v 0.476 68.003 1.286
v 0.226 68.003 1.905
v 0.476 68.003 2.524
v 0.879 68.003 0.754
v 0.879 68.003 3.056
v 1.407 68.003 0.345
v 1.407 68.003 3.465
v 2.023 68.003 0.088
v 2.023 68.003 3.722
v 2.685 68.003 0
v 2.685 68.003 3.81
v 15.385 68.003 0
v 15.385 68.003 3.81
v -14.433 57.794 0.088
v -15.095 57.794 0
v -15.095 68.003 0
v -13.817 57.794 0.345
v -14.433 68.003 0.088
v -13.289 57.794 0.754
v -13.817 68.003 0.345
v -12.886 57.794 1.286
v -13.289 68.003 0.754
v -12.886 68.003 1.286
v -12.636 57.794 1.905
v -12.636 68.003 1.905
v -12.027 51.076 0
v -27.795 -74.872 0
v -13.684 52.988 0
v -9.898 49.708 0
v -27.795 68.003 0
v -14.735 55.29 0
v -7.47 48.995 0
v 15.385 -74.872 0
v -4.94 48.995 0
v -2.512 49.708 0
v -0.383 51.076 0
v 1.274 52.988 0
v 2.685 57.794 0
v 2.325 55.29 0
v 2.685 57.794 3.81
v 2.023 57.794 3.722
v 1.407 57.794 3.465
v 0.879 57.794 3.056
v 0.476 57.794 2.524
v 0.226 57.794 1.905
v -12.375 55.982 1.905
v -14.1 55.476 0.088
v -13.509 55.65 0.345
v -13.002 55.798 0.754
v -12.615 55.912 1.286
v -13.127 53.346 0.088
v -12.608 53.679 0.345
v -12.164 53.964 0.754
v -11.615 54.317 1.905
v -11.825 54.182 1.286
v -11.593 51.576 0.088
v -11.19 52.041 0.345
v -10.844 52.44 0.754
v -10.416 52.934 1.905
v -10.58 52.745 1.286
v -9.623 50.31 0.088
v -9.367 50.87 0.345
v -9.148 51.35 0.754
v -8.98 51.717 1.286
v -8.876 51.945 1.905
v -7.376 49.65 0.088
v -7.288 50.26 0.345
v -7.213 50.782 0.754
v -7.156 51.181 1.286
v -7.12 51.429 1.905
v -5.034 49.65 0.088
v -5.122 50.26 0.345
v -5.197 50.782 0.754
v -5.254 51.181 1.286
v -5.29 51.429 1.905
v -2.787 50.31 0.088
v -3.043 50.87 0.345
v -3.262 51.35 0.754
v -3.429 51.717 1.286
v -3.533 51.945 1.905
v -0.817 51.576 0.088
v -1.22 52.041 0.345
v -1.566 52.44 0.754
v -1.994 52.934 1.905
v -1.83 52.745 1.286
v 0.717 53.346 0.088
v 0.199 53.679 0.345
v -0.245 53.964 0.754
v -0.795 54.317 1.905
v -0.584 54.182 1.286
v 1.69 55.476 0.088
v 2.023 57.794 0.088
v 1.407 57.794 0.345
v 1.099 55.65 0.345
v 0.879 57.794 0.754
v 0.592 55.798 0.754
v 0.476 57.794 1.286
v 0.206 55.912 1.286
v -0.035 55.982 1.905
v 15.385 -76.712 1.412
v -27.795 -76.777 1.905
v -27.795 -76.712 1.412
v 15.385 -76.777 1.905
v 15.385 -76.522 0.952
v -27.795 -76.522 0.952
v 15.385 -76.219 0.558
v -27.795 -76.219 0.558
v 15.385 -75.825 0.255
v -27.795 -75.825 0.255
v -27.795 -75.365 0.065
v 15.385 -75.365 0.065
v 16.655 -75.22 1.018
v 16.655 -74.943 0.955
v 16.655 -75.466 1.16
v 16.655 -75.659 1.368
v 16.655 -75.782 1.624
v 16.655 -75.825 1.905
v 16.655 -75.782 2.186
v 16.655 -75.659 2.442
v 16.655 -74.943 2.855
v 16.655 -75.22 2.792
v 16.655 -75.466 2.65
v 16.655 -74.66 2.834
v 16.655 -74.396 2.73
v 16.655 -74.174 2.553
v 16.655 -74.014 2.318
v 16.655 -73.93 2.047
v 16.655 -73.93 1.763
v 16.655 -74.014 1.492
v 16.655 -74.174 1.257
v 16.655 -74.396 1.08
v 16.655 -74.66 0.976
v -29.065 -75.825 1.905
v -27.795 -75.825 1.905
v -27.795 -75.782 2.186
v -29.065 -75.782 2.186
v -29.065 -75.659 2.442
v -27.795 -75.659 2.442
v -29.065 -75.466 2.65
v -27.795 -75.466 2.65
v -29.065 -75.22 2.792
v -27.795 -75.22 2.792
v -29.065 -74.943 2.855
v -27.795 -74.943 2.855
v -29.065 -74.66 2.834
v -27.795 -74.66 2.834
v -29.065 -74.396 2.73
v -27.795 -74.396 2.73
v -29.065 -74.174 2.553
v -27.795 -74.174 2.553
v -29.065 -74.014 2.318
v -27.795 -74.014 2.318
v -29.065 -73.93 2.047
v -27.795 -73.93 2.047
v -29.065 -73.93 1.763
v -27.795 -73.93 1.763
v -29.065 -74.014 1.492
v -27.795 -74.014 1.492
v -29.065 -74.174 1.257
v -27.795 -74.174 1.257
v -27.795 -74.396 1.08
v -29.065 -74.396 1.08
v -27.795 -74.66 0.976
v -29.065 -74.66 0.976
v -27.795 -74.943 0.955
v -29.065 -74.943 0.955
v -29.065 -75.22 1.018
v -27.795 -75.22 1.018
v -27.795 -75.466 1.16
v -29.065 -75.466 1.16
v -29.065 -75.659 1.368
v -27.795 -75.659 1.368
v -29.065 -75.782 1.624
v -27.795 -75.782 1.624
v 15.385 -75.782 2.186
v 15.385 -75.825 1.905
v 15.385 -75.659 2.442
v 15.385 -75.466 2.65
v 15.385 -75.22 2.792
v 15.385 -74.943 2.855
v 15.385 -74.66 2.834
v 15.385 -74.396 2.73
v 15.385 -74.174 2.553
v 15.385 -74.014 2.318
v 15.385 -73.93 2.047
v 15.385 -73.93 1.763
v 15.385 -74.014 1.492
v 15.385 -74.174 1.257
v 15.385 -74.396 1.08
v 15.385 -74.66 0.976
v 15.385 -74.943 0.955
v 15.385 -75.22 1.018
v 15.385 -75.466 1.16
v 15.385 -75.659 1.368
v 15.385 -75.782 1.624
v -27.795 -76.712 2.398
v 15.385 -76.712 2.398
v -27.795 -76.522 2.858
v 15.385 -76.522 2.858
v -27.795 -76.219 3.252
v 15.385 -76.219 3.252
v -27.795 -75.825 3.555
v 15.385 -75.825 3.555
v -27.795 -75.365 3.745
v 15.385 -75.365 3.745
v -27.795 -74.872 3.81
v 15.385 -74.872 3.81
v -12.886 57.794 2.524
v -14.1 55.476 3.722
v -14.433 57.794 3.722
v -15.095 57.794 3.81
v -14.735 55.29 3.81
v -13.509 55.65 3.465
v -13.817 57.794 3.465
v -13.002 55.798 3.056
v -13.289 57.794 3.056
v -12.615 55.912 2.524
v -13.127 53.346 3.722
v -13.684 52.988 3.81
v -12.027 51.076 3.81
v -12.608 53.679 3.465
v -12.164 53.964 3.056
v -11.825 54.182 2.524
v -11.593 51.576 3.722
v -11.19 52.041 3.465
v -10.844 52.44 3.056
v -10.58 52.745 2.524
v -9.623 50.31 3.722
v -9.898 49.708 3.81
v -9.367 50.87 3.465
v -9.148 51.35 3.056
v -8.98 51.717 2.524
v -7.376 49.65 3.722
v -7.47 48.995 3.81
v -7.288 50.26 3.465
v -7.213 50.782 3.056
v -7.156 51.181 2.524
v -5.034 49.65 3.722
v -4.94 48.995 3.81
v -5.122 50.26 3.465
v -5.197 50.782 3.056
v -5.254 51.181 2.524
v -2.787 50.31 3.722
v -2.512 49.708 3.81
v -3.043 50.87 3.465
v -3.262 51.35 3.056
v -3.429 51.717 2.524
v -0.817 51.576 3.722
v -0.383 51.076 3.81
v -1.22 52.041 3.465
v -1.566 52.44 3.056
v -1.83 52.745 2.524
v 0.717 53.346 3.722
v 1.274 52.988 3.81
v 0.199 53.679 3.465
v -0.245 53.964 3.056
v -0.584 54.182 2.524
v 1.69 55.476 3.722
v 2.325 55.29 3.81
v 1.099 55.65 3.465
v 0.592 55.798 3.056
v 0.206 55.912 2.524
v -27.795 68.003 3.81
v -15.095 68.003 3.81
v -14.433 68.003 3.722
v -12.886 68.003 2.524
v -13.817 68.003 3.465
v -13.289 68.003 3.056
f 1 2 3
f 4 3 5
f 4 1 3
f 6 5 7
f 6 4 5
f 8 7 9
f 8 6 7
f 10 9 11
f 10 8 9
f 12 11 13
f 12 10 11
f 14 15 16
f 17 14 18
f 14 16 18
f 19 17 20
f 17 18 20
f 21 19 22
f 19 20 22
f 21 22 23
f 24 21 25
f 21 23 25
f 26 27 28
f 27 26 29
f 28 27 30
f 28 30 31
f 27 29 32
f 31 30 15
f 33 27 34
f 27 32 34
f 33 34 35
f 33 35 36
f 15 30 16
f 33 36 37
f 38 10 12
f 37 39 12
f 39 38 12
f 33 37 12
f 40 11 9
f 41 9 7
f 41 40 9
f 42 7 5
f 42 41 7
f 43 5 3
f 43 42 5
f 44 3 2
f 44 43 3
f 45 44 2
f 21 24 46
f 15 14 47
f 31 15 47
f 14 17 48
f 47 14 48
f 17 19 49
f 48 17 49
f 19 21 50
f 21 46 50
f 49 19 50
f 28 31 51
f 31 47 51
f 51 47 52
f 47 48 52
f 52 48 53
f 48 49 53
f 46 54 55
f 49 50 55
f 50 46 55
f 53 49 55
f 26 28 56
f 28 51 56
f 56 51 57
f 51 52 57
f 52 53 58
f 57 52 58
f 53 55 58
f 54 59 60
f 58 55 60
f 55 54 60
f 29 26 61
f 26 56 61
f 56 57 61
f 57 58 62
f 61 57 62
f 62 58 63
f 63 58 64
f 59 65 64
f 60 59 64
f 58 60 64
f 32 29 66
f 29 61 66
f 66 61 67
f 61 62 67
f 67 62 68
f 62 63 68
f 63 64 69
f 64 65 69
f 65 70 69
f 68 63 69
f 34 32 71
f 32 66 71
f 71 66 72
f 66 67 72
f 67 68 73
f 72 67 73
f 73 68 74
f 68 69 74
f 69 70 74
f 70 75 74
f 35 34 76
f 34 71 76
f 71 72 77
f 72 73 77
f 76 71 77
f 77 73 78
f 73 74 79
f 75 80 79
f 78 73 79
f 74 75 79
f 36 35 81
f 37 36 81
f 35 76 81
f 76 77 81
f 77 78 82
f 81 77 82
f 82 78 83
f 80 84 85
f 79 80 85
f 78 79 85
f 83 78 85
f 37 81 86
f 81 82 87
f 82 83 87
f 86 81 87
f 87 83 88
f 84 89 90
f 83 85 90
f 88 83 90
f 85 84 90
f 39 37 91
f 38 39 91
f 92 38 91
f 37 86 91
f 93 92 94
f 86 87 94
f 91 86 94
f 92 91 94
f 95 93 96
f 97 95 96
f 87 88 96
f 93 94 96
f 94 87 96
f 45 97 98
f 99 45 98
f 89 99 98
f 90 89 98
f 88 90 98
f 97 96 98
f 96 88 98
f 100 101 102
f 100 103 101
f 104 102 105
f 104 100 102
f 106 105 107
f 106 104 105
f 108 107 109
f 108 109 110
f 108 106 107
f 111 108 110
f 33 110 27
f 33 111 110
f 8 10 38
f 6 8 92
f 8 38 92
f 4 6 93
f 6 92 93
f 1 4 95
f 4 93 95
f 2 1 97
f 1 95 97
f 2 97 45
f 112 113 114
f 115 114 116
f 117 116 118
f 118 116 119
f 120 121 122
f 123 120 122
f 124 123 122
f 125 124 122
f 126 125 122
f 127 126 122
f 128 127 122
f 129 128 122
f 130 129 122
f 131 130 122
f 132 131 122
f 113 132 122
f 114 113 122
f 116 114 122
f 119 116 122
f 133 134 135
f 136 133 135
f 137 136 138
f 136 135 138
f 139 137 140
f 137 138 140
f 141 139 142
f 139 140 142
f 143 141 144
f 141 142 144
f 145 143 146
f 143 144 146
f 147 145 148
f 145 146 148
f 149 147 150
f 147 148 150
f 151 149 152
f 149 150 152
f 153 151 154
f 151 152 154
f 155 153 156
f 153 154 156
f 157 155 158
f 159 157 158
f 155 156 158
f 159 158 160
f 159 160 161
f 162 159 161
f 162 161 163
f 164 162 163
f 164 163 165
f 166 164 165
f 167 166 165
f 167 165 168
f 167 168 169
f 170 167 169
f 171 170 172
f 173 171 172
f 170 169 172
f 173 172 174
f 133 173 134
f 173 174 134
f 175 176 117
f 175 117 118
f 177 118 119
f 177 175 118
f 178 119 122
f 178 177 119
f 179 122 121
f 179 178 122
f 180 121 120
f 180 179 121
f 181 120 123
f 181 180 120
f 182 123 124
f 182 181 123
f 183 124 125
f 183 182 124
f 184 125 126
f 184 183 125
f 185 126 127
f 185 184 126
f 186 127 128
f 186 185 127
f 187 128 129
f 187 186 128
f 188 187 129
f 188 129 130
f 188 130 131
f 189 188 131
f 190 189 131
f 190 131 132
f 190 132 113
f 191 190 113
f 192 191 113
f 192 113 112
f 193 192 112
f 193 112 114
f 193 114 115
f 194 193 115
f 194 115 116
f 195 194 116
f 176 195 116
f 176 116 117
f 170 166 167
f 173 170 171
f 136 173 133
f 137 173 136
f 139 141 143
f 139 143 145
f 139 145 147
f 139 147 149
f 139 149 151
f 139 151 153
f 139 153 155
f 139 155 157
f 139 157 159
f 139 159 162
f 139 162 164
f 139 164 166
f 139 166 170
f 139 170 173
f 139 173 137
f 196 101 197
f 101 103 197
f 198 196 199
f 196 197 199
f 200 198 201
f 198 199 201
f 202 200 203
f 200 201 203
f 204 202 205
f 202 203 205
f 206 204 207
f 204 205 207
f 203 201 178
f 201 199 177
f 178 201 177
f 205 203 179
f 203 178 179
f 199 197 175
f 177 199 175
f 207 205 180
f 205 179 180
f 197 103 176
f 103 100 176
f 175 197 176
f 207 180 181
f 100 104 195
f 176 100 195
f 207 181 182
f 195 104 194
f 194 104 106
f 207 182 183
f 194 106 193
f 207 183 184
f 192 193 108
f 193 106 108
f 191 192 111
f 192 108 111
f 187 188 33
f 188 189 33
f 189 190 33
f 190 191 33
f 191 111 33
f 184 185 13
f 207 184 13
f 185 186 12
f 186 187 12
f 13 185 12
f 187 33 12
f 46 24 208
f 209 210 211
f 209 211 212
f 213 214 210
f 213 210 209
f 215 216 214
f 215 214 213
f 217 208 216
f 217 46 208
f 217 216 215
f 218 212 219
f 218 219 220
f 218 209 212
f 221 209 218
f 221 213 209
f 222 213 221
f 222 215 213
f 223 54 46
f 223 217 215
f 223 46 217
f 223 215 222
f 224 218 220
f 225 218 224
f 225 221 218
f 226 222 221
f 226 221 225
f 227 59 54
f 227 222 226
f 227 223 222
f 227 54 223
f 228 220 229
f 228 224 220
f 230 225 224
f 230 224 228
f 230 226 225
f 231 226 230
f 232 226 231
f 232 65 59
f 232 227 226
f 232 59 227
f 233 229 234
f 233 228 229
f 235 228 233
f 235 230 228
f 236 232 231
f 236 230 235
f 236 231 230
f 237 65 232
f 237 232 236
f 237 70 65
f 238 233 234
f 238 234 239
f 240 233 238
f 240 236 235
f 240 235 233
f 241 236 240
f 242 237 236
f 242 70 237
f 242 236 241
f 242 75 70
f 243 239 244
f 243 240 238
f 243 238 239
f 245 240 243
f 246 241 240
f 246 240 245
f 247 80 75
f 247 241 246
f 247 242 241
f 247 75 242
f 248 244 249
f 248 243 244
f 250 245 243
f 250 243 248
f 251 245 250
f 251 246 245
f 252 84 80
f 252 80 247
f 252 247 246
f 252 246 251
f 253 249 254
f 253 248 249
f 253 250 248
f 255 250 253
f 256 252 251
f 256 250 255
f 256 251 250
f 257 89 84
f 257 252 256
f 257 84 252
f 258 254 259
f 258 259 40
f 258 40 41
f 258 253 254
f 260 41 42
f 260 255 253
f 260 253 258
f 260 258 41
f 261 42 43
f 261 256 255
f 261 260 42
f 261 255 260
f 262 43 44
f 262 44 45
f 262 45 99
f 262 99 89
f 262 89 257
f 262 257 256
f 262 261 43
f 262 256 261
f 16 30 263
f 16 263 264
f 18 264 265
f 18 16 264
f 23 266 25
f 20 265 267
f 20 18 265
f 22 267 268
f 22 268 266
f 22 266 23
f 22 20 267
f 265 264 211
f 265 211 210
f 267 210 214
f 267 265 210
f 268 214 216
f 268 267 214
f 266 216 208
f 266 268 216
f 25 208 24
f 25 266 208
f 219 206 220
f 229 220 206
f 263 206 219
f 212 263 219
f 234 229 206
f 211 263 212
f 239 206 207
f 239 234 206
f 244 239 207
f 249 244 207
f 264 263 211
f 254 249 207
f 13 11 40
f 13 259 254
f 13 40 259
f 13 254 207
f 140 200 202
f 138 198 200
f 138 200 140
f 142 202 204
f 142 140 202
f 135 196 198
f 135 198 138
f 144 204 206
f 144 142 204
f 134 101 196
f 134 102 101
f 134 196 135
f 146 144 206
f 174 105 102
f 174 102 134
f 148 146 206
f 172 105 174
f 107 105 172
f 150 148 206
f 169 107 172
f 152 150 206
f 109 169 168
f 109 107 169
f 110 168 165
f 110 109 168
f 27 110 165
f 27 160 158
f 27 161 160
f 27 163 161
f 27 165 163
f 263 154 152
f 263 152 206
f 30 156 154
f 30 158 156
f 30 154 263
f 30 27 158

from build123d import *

# Parameters (mm, degrees)
F0_W          = 43.18
F0_H          = 144.78
F1_DEPTH      = 3.81
F3_DEPTH      = 25.4
F4_T3_DEPTH   = 16.5585234346
F4_T6_DEPTH   = 16.5585234346
F4_T9_ANGLE   = 180
F4_T12_DEPTH  = 16.5585234346
F4_T15_ANGLE  = 180
F4_T18_DEPTH  = 16.5585234346
F5_R          = 1.90499
F6_R          = 0.9525
F7_DEPTH      = 1.27
F7_DEPTH_BACK = 44.45


# Not quite as in the source:
# - a fillet or chamfer that OpenCascade refuses, or shapes differently, is made with other operations: its cross-section is extruded or revolved along the edge and cut away or added
# - a fillet or chamfer is up to 0.001 mm smaller than in the source, because OpenCascade refuses the exact size


with BuildPart() as f1:
    # F0 (on Top) → F1 (new body)
    with BuildSketch(Plane.XY):
        with Locations((-6.204857491, -4.3873040367)):
            Rectangle(F0_W, F0_H)
    extrude(amount=F1_DEPTH)

    # F2 (on face) → F3 (cut)
    with BuildSketch(Plane.XY.offset(3.81)):
        with BuildLine():
            ThreePointArc((0.145142509, 57.7941725286), (-6.204857491, 64.1441725286), (-12.554857491, 57.7941725286))
            Line((-12.554857491, 57.7941725286), (0.145142509, 57.7941725286))
        make_face()
        with BuildLine():
            Line((0.145142509, 68.0026959633), (-12.554857491, 68.0026959633))
            Line((-12.554857491, 68.0026959633), (-12.554857491, 57.7941725286))
            ThreePointArc((-12.554857491, 57.7941725286), (-6.204857491, 64.1441725286), (0.145142509, 57.7941725286))
            Line((0.145142509, 57.7941725286), (0.145142509, 68.0026959633))
        make_face()
        with BuildLine():
            Line((0.145142509, 57.7941725286), (-12.554857491, 57.7941725286))
            ThreePointArc((-12.554857491, 57.7941725286), (-6.204857491, 51.4441725286), (0.145142509, 57.7941725286))
        make_face()
    extrude(amount=-F3_DEPTH, mode=Mode.SUBTRACT)

    # F4: fillet of radius 2.54 on 2 edges, made by hand


with BuildPart() as f4_tool1:
    # F4_s2 → F4_t3 (new body)
    with BuildSketch(Plane.XZ.offset(-74.3526959633)):
        with BuildLine():
            ThreePointArc((-15.094857491, 3.81), (-13.2988062667, 3.0660512242), (-12.554857491, 1.27))
            Line((-12.554857491, 1.27), (-12.554857491, 3.81))
            Line((-12.554857491, 3.81), (-15.094857491, 3.81))
        make_face()
    extrude(amount=F4_T3_DEPTH)


with BuildPart() as f4_tool4:
    # F4_s5 → F4_t6 (new body)
    with BuildSketch(Plane.XZ.offset(-74.3526959633)):
        with BuildLine():
            ThreePointArc((-15.094857491, 0), (-13.2988062667, 0.7439487758), (-12.554857491, 2.54))
            Line((-12.554857491, 2.54), (-12.554857491, 0))
            Line((-12.554857491, 0), (-15.094857491, 0))
        make_face()
    extrude(amount=F4_T6_DEPTH)


with BuildPart() as f4_tool7:
    # F4_s8 → F4_t9 (revolve)
    with BuildSketch(Plane.XZ.offset(-57.7941725286)):
        with BuildLine():
            ThreePointArc((-15.094857491, 0), (-13.2988062667, 0.7439487758), (-12.554857491, 2.54))
            Line((-12.554857491, 2.54), (-12.554857491, 0))
            Line((-12.554857491, 0), (-15.094857491, 0))
        make_face()
    revolve(axis=Axis((-6.204857491, 57.7941725286, 0), (0, 0, 1)), revolution_arc=F4_T9_ANGLE)


with BuildPart() as f4_tool10:
    # F4_s11 → F4_t12 (new body)
    with BuildSketch(Plane.XZ.offset(-57.7941725286)):
        with BuildLine():
            ThreePointArc((2.685142509, 0), (0.8890912848, 0.7439487758), (0.145142509, 2.54))
            Line((0.145142509, 2.54), (0.145142509, 0))
            Line((0.145142509, 0), (2.685142509, 0))
        make_face()
    extrude(amount=-F4_T12_DEPTH)


with BuildPart() as f4_tool13:
    # F4_s14 → F4_t15 (revolve)
    with BuildSketch(Plane.XZ.offset(-57.7941725286)):
        with BuildLine():
            ThreePointArc((-15.094857491, 3.81), (-13.2988062667, 3.0660512242), (-12.554857491, 1.27))
            Line((-12.554857491, 1.27), (-12.554857491, 3.81))
            Line((-12.554857491, 3.81), (-15.094857491, 3.81))
        make_face()
    revolve(axis=Axis((-6.204857491, 57.7941725286, 3.81), (0, 0, 1)), revolution_arc=F4_T15_ANGLE)


with BuildPart() as f4_tool16:
    # F4_s17 → F4_t18 (new body)
    with BuildSketch(Plane.XZ.offset(-57.7941725286)):
        with BuildLine():
            ThreePointArc((2.685142509, 3.81), (0.8890912848, 3.0660512242), (0.145142509, 1.27))
            Line((0.145142509, 1.27), (0.145142509, 3.81))
            Line((0.145142509, 3.81), (2.685142509, 3.81))
        make_face()
    extrude(amount=-F4_T18_DEPTH)


with BuildPart() as f1_1:
    add(f1.part)

    # F4_t19: cut F4_tool1, F4_tool4, F4_tool7, F4_tool10, F4_tool13, F4_tool16
    add([f4_tool1.part, f4_tool4.part, f4_tool7.part, f4_tool10.part, f4_tool13.part, f4_tool16.part], mode=Mode.SUBTRACT)

    # F5 (radius 1.905 in the source; OpenCascade refuses exactly that, so slightly less here)
    f5_edges = [f1_1.edges().sort_by_distance(p)[0] for p in [
        (-6.204857, -76.777304, 3.81),
        (-6.204857, -76.777304, 0),
    ]]
    fillet(f5_edges, radius=F5_R)

    # F6 (on face) → F7 (join, two sides)
    with BuildSketch(Plane(origin=(-27.794857491, 0, 0), x_dir=(0, -1, 0), z_dir=(-1, 0, 0))) as f7_sk:
        with Locations((74.8723040367, 1.905)):
            Circle(F6_R)
    extrude(amount=F7_DEPTH)
    extrude(f7_sk.sketch, amount=-F7_DEPTH_BACK)


solid = f1_1.part
